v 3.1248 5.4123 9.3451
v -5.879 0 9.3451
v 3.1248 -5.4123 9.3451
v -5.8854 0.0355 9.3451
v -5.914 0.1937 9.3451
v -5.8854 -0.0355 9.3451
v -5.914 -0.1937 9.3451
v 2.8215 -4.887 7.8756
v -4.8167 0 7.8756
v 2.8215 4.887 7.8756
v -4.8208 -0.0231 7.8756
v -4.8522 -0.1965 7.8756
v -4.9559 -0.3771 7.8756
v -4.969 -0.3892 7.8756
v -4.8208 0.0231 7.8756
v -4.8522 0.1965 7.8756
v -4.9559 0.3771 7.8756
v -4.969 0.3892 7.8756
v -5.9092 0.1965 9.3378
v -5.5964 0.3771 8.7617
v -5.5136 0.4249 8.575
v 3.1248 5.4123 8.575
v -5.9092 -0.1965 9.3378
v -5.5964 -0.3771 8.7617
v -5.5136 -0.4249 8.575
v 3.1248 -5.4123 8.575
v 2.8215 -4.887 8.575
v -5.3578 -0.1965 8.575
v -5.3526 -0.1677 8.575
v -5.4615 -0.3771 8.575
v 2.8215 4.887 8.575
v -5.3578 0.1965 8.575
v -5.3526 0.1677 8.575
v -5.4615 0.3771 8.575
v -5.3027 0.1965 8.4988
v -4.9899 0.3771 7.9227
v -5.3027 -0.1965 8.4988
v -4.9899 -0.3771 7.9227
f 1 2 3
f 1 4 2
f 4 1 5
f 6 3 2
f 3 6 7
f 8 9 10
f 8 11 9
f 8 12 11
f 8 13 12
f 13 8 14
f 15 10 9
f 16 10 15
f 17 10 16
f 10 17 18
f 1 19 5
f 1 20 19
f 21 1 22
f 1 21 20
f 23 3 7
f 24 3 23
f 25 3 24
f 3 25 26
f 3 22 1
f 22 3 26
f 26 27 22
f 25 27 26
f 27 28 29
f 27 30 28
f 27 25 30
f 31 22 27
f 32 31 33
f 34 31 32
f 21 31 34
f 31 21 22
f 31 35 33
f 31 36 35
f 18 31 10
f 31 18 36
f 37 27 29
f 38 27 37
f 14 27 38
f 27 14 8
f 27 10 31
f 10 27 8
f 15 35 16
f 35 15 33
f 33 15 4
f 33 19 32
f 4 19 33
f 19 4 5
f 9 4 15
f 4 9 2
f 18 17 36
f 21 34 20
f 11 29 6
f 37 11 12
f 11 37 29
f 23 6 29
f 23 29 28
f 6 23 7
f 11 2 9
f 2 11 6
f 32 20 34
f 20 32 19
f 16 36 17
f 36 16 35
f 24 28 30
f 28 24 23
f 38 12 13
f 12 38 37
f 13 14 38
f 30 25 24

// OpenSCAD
angle = 20.905;
externalRadius = 12;
internalRdius = 10.113; // Pour épaisseur paroi 1.5 mm
diametreTrouBouchon = 1.5;
echelleReductionAjustementBouchon = 0.93;
r = 0.19; // résolution d'impression sur l'axe Z

//ico_creux();
//decoupe_bouchon();
//corps_ouvert();
bouchon_trou();
//trou();

module corps_ouvert() {
    //rotate([180, 0, 0])
	difference() {
		ico_creux();
		decoupe_bouchon();
        trou();
	}
}

module bouchon_trou(version) {
	scale([echelleReductionAjustementBouchon, echelleReductionAjustementBouchon, 0.98])
	difference () {
        intersection() {
            ico_creux();
            decoupe_bouchon(echelleReductionAjustementBouchon);
        }
        trou();
        // trou centre face
//		translate([0, 0, externalRadius*0.5])
//		cylinder(30, r=diametreTrouBouchon/2, $fn=22);
	}
}

module trou() {
    rotate([0, -37.3, 0])
		translate([0, 0, externalRadius*0.5])
		cylinder(30, r=diametreTrouBouchon/2, $fn=22);
}

module ico_creux() {
	difference() {
        rotate([0, angle, 0]) icosahedron(externalRadius);
        rotate([0, angle, 0]) icosahedron(internalRdius);
	}
}

module decoupe_bouchon(scale=1) {
	rotate([0,0,60]) translate([0,0,externalRadius*0.65+5*r])
		cylinder(6*r, r=externalRadius*0.56, $fn=3);
	rotate([0,0,60]) translate([0,0,externalRadius*0.65])
		cylinder(6*r, r=internalRdius*0.6, $fn=3);
}

module icosahedron(rad=1) {
	Cphi = (1+sqrt(5))/2;

	// Convert spherical to cartesian
	function sph_to_cart(c, rad) = [
		rad*sin(atan2(sqrt(c[0]*c[0]+c[1]*c[1]), c[2]))*cos(atan2(c[1],c[0])),  
		rad*sin(atan2(sqrt(c[0]*c[0]+c[1]*c[1]), c[2]))*sin(atan2(c[1],c[0])),
		rad*cos(atan2(sqrt(c[0]*c[0]+c[1]*c[1]), c[2]))
		];


	//================================================
	//	Icosahedron
	//================================================
	//
	// (0, +-1, +-Cphi)
	// (+-Cphi, 0, +-1)
	// (+-1, +-Cphi, 0)

	function icosa_unit(rad) = [
		sph_to_cart([0, +1, +Cphi], rad), 
		sph_to_cart([0, +1, -Cphi], rad),
		sph_to_cart([0, -1, -Cphi], rad),
		sph_to_cart([0, -1, +Cphi], rad),
		sph_to_cart([+Cphi, 0, +1], rad), 
		sph_to_cart([+Cphi, 0, -1], rad), 
		sph_to_cart([-Cphi, 0, -1], rad),
		sph_to_cart([-Cphi, 0, +1], rad),
		sph_to_cart([+1, +Cphi, 0], rad),
		sph_to_cart([+1, -Cphi, 0], rad), 
		sph_to_cart([-1, -Cphi, 0], rad), 
		sph_to_cart([-1, +Cphi, 0], rad),
		];

	icosa_faces = [ 
		[3,0,4],
		[3,4,9],
		[3,9,10],
		[3,10,7],
		[3,7,0],
		[0,8,4],
		[0,7,11],
		[0,11,8],
		[4,8,5],
		[4,5,9],
		[7,10,6],
		[7,6,11],
		[9,5,2],
		[9,2,10],
		[2,6,10],
		[1,5,8],
		[1,8,11],
		[1,11,6],
		[5,1,2],
		[2,1,6]
		];

	polyhedron(icosa_unit(rad), faces = icosa_faces);
}
